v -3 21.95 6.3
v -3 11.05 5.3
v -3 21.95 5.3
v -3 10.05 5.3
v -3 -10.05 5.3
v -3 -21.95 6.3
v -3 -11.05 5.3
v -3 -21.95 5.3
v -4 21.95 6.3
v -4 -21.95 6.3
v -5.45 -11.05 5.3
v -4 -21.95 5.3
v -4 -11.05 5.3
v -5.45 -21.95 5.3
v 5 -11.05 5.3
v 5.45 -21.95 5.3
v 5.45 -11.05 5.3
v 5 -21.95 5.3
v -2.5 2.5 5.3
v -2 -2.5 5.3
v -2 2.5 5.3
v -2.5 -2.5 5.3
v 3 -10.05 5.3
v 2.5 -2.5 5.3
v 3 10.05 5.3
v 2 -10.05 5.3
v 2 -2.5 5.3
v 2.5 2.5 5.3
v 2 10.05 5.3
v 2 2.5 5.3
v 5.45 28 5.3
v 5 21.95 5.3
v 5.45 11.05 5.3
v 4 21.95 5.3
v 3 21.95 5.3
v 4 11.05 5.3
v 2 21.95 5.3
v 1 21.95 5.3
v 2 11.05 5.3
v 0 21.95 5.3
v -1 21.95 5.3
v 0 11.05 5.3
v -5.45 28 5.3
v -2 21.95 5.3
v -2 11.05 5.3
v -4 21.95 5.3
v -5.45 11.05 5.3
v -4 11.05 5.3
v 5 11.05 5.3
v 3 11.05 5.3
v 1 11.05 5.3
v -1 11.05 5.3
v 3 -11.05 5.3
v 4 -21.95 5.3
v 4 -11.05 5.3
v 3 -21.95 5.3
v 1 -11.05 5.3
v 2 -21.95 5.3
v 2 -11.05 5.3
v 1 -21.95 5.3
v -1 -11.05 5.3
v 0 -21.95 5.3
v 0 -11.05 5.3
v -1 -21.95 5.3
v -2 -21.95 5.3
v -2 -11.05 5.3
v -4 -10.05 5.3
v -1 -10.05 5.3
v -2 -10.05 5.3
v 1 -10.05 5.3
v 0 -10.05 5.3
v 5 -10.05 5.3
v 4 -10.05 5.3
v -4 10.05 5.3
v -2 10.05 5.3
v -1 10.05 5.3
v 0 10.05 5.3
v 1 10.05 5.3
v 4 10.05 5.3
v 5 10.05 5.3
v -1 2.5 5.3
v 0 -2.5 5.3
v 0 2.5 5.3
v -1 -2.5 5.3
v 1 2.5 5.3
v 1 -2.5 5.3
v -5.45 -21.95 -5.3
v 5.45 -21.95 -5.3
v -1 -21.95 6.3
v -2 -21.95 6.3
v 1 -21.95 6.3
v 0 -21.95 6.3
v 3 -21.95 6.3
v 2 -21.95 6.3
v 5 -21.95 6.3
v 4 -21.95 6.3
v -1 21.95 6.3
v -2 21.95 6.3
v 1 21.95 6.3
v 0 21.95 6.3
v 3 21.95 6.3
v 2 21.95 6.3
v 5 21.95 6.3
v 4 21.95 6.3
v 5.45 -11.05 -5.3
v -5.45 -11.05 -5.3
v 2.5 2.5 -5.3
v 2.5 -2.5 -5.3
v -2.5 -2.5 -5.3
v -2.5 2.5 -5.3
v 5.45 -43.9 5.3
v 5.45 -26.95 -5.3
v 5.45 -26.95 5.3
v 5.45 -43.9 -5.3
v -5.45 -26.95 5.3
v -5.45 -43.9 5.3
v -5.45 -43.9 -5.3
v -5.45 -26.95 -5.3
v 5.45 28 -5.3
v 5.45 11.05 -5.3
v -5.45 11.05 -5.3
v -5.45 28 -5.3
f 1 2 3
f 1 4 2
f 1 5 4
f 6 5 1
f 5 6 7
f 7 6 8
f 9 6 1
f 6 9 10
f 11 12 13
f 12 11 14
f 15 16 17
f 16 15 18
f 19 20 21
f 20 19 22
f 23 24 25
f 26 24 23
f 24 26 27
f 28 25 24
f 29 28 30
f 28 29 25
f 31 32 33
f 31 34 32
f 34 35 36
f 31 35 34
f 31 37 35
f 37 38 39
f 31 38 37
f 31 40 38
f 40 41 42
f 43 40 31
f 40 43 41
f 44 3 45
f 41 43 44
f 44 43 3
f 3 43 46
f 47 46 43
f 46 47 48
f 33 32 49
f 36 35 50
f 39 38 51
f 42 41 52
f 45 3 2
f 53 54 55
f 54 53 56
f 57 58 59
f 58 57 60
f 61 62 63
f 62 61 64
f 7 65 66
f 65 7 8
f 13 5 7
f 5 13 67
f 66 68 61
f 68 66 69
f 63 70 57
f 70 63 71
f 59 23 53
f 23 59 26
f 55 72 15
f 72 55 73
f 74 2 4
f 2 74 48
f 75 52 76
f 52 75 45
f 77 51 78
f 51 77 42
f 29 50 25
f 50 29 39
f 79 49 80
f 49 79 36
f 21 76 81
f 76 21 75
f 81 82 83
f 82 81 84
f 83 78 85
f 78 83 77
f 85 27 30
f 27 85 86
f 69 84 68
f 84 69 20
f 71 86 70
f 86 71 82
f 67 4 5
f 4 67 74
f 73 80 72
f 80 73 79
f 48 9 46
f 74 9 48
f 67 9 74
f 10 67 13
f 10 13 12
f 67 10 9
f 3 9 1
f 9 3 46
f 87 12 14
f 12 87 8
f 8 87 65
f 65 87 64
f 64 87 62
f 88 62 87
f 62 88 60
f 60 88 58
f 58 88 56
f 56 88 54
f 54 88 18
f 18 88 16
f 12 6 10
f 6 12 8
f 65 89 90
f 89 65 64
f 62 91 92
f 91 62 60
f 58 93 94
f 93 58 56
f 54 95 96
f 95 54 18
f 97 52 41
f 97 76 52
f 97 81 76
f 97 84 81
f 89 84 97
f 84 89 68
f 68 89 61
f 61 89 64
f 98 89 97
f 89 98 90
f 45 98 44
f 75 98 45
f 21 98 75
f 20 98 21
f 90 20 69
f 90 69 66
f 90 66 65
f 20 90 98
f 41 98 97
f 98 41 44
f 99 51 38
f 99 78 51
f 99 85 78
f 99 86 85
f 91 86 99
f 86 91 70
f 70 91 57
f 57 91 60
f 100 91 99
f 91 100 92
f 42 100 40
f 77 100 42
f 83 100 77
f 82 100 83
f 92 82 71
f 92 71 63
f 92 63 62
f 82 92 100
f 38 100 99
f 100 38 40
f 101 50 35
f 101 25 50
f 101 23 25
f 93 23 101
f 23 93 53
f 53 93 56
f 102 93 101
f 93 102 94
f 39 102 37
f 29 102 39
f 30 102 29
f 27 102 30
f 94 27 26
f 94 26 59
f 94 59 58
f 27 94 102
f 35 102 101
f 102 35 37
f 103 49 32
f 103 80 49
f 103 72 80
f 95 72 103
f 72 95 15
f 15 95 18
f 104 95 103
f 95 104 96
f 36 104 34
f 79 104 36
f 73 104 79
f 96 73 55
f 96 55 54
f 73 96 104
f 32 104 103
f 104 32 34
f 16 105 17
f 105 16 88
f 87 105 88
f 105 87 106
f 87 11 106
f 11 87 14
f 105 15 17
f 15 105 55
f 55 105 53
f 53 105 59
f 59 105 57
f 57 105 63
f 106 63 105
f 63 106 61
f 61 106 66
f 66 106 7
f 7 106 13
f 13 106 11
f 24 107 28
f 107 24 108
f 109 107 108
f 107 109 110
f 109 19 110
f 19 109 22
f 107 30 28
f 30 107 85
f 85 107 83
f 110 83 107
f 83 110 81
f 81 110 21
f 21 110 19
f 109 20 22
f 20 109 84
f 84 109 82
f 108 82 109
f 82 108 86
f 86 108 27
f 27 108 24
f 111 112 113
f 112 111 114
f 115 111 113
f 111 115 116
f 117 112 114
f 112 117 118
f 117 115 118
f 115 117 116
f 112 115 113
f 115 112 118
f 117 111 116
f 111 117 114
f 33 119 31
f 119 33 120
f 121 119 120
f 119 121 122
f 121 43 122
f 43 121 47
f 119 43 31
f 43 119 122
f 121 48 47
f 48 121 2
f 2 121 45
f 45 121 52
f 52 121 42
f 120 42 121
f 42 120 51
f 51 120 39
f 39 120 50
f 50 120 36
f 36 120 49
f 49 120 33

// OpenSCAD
module bracket() {
    difference() {
        union() {
            // Central block with square window
            translate([-5.45, -21.95, -5.3])
                cube([10.9, 10.9, 10.6]);
            translate([-2.5, -2.5, -5.3])
                cube([5, 5, 10.6]);

            // Left arm
            translate([-5.45, -43.9, -5.3])
                cube([10.9, 16.95, 10.6]);

            // Right arm
            translate([-5.45, 11.05, -5.3])
                cube([10.9, 16.95, 10.6]);

            // Ribs on one face
            for (i = [-4, -2, 0, 2, 4]) {
                translate([i, -21.95, 5.3])
                    cube([1, 43.9, 1]);
            }
        }
        // Fillet transitions (approximated with small cubes)
        translate([-5.45, -11.05, -5.3])
            cube([10.9, 1, 10.6]);
        translate([-5.45, 10.05, -5.3])
            cube([10.9, 1, 10.6]);
    }
}

bracket();
